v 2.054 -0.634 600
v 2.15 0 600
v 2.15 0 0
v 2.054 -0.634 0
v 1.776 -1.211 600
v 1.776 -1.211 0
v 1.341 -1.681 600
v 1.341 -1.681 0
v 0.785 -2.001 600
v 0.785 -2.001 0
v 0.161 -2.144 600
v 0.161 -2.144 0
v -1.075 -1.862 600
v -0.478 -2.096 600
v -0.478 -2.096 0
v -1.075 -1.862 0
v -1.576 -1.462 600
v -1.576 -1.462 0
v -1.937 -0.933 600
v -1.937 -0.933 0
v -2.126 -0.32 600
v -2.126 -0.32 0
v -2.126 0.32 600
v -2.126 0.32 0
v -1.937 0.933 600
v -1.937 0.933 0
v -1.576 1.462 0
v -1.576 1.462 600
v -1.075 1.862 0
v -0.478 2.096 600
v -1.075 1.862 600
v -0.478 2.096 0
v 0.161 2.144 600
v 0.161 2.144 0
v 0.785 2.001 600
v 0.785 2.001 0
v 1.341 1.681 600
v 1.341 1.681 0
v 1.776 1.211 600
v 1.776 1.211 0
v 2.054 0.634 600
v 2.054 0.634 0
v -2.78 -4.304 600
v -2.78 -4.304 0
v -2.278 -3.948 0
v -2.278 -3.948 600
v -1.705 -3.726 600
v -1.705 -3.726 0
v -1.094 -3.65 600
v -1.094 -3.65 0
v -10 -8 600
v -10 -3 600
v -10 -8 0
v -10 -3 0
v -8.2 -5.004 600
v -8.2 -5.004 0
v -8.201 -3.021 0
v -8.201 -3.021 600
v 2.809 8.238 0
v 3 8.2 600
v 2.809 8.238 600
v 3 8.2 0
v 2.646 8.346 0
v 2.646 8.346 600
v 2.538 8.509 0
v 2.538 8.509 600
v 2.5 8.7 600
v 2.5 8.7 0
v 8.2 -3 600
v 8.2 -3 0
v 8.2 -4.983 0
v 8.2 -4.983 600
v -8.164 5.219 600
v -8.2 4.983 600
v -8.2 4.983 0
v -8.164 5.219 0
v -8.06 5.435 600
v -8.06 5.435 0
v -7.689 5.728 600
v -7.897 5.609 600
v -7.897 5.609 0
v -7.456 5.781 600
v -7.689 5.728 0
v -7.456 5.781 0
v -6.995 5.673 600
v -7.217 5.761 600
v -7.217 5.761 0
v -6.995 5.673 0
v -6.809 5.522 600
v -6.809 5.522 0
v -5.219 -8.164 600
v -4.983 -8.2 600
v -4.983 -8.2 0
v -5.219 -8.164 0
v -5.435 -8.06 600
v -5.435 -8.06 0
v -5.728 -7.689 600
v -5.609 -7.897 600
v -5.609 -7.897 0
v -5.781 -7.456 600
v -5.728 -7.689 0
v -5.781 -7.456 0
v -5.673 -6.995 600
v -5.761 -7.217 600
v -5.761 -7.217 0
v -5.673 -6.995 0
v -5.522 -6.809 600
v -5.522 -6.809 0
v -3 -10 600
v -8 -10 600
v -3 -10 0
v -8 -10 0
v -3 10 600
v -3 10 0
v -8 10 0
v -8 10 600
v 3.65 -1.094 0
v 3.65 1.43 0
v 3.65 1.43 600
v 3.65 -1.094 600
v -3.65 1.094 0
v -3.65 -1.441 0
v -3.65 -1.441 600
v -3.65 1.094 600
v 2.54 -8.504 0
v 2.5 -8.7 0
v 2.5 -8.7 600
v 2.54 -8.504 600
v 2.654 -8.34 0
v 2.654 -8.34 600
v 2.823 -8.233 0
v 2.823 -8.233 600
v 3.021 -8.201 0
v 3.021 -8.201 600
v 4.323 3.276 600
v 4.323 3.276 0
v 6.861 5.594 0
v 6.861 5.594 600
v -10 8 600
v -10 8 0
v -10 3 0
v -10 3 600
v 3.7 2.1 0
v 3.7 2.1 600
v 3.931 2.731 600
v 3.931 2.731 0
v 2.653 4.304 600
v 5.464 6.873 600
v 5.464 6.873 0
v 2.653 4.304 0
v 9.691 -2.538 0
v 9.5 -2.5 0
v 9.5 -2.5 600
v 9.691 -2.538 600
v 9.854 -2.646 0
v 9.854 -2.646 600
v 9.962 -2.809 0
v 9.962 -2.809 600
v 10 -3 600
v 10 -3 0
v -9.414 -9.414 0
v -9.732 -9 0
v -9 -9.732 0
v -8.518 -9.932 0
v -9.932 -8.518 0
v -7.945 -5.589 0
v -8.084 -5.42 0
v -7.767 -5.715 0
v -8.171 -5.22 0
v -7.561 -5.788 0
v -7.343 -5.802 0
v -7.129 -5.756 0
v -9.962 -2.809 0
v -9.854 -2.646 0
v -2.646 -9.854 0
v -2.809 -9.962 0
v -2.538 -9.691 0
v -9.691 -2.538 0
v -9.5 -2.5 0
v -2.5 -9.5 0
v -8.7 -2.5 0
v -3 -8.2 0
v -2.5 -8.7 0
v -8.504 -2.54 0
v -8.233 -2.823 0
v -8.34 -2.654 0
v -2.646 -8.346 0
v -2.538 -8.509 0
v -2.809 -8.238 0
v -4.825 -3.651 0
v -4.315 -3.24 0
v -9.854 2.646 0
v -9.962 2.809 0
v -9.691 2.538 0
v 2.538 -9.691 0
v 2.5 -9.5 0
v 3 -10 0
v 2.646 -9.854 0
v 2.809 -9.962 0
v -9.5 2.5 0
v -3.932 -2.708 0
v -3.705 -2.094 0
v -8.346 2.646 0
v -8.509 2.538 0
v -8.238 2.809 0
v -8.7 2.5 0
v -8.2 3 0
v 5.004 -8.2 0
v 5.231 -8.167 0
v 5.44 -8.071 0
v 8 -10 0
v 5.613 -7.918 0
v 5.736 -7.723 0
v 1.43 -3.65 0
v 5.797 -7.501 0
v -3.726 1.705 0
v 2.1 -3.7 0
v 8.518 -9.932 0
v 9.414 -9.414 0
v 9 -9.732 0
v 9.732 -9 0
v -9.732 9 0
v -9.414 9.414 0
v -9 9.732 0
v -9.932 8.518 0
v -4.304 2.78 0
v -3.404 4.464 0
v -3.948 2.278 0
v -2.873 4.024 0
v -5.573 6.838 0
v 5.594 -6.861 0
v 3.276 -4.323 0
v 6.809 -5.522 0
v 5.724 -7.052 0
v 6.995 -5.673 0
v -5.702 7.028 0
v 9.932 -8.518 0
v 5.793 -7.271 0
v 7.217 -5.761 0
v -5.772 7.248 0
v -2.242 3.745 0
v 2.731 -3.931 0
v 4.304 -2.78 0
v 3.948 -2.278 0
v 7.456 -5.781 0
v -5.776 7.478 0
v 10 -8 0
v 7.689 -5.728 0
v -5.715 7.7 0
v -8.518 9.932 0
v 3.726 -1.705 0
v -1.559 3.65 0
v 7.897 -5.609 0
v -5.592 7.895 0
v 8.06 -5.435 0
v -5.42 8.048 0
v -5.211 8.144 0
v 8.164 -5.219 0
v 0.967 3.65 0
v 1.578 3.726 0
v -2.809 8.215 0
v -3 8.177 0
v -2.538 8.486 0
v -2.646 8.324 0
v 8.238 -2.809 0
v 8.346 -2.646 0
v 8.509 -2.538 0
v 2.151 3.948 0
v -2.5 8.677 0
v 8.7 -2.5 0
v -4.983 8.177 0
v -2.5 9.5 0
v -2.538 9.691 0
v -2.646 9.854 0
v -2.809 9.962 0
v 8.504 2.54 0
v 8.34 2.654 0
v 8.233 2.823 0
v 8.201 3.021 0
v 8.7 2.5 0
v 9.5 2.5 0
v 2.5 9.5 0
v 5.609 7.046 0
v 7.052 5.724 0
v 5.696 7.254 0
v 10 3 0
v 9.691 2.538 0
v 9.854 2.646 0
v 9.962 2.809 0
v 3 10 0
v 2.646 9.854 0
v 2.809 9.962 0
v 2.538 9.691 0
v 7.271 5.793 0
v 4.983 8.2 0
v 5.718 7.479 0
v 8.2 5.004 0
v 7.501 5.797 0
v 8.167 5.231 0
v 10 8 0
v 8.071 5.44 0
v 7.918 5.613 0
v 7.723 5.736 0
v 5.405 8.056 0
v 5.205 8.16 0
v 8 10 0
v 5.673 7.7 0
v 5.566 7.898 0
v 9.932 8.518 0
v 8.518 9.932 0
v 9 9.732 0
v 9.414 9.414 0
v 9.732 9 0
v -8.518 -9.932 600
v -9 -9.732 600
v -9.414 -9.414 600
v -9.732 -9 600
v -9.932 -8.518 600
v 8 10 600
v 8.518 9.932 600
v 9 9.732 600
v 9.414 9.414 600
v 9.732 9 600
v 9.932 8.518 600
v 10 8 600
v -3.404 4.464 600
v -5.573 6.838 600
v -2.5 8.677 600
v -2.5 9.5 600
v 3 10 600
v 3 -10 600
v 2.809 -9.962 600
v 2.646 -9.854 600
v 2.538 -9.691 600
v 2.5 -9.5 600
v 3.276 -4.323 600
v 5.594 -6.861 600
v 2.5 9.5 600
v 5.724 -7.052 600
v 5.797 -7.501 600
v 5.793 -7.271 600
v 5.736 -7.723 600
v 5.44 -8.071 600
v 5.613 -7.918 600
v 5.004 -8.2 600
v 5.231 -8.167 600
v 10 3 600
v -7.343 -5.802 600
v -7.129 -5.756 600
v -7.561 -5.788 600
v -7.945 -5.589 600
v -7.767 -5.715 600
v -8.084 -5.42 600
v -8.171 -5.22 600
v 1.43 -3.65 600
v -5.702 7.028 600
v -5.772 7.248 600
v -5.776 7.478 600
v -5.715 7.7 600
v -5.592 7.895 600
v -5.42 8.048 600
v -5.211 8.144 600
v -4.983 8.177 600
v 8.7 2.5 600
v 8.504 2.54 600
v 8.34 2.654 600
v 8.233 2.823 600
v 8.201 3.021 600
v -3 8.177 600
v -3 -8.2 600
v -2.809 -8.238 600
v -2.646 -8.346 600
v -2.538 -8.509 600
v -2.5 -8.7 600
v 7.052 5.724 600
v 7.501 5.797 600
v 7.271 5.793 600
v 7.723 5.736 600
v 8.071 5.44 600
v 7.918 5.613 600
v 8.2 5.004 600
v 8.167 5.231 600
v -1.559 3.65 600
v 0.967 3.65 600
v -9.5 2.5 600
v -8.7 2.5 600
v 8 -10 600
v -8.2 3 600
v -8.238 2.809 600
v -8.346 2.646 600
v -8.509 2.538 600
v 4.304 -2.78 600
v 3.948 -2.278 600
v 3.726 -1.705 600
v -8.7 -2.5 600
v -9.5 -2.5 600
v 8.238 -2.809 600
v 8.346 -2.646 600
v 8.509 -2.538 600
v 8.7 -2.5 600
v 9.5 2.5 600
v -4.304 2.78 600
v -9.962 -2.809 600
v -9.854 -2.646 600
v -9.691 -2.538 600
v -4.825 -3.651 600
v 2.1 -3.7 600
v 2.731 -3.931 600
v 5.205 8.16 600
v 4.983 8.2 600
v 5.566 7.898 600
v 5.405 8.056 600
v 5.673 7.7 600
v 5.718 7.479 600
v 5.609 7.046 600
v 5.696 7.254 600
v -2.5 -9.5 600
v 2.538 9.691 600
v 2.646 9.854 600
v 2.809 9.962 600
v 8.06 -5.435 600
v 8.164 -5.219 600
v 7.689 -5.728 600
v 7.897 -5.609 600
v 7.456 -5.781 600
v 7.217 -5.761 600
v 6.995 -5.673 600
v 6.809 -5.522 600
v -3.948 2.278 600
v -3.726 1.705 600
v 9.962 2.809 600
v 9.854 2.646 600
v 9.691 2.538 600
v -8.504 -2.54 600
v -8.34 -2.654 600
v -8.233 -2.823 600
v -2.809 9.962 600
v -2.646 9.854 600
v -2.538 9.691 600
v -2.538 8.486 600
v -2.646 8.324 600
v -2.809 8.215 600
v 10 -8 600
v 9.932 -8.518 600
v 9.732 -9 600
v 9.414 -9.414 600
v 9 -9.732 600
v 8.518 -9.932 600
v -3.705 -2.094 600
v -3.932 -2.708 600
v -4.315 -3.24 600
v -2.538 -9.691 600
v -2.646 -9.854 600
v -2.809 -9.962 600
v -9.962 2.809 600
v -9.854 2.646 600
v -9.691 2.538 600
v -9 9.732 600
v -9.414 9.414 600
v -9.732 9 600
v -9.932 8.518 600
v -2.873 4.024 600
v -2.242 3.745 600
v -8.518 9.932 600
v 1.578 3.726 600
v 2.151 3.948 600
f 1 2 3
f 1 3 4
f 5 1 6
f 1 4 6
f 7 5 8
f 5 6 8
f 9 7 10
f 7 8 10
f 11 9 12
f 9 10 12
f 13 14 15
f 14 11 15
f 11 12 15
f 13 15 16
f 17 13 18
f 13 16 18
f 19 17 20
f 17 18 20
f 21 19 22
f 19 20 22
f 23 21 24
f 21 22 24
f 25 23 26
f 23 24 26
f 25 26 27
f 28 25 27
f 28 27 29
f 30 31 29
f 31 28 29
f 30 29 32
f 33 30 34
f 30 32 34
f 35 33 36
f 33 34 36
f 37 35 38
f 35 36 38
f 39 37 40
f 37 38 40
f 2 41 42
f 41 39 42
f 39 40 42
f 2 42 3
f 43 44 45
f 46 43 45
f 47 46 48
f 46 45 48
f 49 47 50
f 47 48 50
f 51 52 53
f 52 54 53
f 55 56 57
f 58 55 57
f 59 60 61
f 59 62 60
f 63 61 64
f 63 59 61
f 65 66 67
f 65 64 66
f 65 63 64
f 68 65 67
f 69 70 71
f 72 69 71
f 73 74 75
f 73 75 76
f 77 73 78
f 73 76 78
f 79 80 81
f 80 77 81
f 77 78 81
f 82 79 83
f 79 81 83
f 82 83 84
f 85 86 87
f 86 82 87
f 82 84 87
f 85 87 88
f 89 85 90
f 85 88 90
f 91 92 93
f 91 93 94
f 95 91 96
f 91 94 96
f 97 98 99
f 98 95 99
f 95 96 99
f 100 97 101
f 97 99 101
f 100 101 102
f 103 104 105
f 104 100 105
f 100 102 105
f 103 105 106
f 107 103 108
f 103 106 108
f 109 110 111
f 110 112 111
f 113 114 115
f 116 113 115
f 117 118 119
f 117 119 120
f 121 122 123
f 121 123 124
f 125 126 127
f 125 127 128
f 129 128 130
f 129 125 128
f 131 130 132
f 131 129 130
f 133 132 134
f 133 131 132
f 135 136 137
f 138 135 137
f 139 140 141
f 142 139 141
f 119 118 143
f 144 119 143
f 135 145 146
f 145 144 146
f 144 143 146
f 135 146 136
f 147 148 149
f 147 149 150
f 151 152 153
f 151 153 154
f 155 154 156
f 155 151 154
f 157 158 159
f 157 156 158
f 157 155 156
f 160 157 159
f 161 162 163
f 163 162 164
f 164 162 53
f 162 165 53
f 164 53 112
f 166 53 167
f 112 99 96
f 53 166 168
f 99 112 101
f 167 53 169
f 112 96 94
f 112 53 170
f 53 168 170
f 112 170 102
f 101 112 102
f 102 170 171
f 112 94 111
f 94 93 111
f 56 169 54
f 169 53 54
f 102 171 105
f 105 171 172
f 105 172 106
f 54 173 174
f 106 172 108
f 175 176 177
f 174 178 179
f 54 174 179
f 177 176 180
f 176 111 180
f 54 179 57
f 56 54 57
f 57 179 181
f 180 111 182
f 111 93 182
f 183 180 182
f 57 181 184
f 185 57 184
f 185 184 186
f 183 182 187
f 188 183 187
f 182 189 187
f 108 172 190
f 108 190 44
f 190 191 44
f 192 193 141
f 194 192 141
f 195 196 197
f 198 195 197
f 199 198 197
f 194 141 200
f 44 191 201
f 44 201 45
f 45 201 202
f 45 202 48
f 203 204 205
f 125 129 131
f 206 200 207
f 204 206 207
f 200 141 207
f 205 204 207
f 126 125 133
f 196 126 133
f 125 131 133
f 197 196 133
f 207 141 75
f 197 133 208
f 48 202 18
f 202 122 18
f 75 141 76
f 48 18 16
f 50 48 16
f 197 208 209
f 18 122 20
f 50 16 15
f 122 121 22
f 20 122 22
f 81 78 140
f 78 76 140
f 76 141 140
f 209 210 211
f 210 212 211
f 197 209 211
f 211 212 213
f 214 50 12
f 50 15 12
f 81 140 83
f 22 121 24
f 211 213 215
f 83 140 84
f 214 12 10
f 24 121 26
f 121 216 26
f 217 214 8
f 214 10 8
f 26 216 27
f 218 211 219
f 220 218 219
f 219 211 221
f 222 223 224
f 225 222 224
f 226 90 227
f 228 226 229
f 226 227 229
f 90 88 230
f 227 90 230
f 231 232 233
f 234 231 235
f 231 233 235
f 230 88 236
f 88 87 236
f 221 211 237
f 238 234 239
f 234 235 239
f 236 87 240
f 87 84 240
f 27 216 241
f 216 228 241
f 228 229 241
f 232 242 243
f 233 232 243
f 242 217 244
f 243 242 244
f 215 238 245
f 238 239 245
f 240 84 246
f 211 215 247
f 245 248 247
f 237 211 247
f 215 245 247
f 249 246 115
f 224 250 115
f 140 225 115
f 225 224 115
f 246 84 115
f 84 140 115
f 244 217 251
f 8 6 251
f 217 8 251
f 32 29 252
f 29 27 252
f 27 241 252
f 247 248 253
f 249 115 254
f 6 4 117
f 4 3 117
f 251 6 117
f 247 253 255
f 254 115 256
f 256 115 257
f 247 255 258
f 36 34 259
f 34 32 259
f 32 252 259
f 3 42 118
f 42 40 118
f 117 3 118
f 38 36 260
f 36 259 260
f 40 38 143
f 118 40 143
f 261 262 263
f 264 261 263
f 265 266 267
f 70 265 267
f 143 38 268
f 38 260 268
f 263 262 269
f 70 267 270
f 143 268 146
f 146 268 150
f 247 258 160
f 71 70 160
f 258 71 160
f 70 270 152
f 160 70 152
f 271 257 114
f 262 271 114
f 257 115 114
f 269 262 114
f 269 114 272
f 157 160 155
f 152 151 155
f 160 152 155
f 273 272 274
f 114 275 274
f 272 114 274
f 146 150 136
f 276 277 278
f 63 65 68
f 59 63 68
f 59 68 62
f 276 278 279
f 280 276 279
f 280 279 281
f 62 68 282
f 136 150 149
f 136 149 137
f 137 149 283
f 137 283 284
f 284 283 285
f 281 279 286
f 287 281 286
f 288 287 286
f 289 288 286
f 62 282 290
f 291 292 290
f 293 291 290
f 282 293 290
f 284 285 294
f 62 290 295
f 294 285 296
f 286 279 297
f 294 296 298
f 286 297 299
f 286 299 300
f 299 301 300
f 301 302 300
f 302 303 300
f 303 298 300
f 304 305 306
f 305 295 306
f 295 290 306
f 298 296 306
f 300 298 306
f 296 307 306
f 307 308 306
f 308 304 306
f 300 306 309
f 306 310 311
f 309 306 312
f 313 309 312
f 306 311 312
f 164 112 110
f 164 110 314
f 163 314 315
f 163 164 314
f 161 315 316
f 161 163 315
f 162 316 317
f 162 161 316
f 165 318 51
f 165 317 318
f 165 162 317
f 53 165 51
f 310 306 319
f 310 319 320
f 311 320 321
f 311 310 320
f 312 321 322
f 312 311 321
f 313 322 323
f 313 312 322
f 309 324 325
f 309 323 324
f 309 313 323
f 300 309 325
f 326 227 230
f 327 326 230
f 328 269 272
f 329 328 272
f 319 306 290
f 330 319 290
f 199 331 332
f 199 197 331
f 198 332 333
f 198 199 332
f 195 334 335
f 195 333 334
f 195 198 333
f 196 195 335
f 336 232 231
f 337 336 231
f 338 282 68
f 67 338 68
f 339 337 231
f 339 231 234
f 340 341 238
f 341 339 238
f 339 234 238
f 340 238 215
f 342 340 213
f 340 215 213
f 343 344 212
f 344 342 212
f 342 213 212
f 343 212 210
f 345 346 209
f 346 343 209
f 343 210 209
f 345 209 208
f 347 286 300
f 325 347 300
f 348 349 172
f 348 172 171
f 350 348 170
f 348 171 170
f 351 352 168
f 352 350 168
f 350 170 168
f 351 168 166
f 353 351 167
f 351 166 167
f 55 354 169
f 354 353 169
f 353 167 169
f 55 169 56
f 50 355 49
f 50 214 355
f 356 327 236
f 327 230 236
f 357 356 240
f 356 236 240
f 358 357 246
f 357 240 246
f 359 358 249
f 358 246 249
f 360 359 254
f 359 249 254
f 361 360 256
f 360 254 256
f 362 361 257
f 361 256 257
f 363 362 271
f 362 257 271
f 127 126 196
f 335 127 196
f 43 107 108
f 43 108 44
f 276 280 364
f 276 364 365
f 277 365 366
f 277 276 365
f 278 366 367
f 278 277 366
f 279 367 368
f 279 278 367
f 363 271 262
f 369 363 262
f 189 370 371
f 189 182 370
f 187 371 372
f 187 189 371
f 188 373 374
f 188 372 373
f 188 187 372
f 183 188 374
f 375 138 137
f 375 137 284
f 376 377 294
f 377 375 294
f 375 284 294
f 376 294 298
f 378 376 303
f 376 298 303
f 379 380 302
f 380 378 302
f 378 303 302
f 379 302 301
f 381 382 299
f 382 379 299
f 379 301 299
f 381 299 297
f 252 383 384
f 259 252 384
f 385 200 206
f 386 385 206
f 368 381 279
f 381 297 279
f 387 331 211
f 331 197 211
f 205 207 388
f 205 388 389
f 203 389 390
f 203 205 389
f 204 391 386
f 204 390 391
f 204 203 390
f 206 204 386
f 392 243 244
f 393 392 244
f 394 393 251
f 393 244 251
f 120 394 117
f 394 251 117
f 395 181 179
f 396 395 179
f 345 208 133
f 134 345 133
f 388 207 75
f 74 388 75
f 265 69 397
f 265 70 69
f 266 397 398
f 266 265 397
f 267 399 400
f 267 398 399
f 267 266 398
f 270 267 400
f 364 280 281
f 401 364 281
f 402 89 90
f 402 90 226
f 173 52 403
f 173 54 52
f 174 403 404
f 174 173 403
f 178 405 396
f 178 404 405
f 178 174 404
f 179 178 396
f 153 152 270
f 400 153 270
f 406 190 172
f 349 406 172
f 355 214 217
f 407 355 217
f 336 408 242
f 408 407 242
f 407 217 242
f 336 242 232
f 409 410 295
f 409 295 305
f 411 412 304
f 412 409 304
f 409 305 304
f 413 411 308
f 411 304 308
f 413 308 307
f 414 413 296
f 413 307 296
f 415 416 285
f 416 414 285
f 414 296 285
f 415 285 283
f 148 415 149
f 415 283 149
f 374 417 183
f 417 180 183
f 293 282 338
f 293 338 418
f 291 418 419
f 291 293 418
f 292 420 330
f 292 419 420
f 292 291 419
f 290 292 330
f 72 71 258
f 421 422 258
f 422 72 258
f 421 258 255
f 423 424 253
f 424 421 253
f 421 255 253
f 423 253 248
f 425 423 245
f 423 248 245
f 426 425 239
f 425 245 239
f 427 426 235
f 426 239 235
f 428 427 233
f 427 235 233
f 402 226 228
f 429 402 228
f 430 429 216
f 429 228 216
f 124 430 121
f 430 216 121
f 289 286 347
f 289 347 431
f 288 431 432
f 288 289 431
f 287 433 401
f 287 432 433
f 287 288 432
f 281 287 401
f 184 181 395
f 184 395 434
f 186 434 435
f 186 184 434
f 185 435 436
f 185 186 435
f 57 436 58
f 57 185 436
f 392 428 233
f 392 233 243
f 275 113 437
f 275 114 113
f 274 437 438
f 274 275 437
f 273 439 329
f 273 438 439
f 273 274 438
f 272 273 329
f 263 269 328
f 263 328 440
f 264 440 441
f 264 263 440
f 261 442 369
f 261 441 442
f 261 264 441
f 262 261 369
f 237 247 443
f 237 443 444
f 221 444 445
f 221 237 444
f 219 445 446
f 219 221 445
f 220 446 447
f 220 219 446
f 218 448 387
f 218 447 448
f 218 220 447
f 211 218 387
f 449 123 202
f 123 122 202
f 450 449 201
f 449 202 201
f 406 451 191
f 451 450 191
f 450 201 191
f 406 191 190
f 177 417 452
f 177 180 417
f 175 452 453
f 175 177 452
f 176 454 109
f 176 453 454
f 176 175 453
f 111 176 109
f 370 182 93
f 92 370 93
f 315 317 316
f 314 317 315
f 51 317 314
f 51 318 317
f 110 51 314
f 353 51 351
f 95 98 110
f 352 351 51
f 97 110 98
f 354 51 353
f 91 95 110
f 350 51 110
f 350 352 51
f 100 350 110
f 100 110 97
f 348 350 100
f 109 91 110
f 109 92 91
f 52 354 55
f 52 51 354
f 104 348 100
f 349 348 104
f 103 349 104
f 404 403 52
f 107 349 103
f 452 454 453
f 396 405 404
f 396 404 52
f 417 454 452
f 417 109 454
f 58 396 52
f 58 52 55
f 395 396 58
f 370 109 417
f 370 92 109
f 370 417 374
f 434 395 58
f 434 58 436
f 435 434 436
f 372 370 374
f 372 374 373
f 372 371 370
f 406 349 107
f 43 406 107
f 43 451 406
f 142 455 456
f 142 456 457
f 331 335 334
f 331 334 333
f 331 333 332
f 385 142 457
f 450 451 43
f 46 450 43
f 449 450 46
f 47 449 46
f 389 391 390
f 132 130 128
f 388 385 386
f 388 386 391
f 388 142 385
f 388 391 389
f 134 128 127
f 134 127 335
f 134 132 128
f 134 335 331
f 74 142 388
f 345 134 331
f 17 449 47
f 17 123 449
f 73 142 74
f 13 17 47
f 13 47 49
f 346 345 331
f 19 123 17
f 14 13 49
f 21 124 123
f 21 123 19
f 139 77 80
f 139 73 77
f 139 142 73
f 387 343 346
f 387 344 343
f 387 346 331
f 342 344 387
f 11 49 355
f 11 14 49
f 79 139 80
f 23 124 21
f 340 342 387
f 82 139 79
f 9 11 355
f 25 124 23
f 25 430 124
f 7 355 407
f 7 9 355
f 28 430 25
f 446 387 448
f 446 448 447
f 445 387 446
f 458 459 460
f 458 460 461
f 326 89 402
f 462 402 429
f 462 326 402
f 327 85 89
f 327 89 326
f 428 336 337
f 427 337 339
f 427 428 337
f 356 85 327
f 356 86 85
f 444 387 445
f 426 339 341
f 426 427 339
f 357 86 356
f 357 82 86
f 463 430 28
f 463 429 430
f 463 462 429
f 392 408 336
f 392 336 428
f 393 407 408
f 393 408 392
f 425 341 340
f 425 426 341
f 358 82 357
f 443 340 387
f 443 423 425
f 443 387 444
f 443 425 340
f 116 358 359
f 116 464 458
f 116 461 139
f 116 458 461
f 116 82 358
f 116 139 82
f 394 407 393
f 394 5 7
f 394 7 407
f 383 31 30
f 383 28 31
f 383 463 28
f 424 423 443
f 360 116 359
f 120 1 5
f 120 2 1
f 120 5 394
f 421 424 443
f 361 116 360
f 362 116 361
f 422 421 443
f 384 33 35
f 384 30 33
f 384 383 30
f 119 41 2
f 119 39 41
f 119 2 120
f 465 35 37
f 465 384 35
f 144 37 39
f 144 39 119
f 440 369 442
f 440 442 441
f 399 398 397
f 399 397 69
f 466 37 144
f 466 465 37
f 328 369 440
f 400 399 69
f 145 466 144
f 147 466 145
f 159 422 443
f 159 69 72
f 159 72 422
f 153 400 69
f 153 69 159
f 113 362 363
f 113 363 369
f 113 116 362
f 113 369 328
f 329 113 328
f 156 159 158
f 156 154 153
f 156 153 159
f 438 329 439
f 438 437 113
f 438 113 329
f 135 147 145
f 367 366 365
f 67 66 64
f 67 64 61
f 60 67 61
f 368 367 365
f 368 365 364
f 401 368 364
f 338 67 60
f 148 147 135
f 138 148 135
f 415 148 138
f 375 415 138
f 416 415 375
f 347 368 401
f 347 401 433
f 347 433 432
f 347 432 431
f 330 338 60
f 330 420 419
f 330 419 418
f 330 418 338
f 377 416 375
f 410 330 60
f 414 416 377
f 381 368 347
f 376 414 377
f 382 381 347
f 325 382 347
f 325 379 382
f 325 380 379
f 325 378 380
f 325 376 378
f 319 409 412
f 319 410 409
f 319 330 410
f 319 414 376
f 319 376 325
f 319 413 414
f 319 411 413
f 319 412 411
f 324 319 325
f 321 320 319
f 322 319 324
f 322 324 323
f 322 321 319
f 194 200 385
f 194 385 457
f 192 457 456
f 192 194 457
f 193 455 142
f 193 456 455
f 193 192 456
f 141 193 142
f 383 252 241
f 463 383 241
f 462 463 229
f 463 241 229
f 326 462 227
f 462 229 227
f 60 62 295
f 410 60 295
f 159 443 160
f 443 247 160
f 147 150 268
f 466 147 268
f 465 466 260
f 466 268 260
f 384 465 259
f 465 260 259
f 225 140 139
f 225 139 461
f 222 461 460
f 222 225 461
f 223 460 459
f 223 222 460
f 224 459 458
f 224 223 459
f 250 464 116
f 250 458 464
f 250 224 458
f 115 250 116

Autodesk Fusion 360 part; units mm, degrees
sketch "Sketch2" plane through (0, 0, 0) normal (0, 0, 1) x (1, 0, 0) in component "Component"
  circle A0 centre (0, 0) radius 2.15
  line L0 (-3.4043, 4.4638) -> (-5.5732, 6.8378)
  line L1 (-4.9826, 8.1774) -> (-3, 8.1774)
  line L2 (-2.5, 8.6774) -> (-2.5, 9.5)
  line L3 (-3, 10) -> (-8, 10)
  line L4 (-10, 8) -> (-10, 3)
  line L5 (-9.5, 2.5) -> (-8.7, 2.5)
  line L6 (-8.2, 3) -> (-8.2, 4.9826)
  line L7 (-6.8094, 5.5222) -> (-4.3043, 2.7802)
  arc A1 (-8, 10) -> (-10, 8) centre (-8, 8) ccw
  arc A2 (-2.5, 9.5) -> (-3, 10) centre (-3, 9.5) ccw
  arc A3 (-10, 3) -> (-9.5, 2.5) centre (-9.5, 3) ccw
  arc A4 (-8.7, 2.5) -> (-8.2, 3) centre (-8.7, 3) ccw
  arc A5 (-6.8094, 5.5222) -> (-8.2, 4.9826) centre (-7.4, 4.9826) ccw
  arc A6 (-4.9826, 8.1774) -> (-5.5732, 6.8378) centre (-4.9826, 7.3774) ccw
  arc A7 (-3, 8.1774) -> (-2.5, 8.6774) centre (-3, 8.6774) ccw
  line L8 (-1.5586, 3.65) -> (0.9669, 3.65)
  arc A8 (-3.4043, 4.4638) -> (-1.5586, 3.65) centre (-1.5586, 6.15) ccw
  arc A9 (-4.8251, -3.6514) -> (-3.65, -1.4406) centre (-6.0873, -1.5628) ccw
  arc A10 (-8.2009, -3.0209) -> (-8.7005, -2.5) centre (-8.7005, -3) ccw
  arc A11 (-3, -10) -> (-2.5, -9.5) centre (-3, -9.5) ccw
  arc A12 (-9.5, -2.5) -> (-10, -3) centre (-9.5, -3) ccw
  line L9 (-2.5, -9.5) -> (-2.5, -8.7)
  line L10 (-10, -3) -> (-10, -8)
  line L11 (-8.7005, -2.5) -> (-9.5, -2.5)
  arc A13 (-2.5, -8.7) -> (-3, -8.2) centre (-3, -8.7) ccw
  line L12 (-4.8251, -3.6514) -> (-7.1291, -5.7563)
  line L13 (-3.65, -1.4406) -> (-3.65, 1.094)
  line L14 (-3, -8.2) -> (-4.9826, -8.2)
  arc A14 (-8.2005, -5.0035) -> (-7.1291, -5.7563) centre (-7.4005, -5.0037) ccw
  arc A15 (-5.5222, -6.8094) -> (-4.9826, -8.2) centre (-4.9826, -7.4) ccw
  line L15 (-8, -10) -> (-3, -10)
  line L16 (-8.2005, -5.0035) -> (-8.2009, -3.0209)
  line L17 (-5.5222, -6.8094) -> (-2.7802, -4.3043)
  arc A16 (3.2759, -4.3232) -> (1.4298, -3.65) centre (1.5824, -6.0993) ccw
  arc A17 (3.0209, -8.2009) -> (2.5, -8.7005) centre (3, -8.7005) ccw
  arc A18 (10, -3) -> (9.5, -2.5) centre (9.5, -3) ccw
  arc A19 (2.5, -9.5) -> (3, -10) centre (3, -9.5) ccw
  line L18 (9.5, -2.5) -> (8.7, -2.5)
  line L19 (3, -10) -> (8, -10)
  line L20 (2.5, -8.7005) -> (2.5, -9.5)
  arc A20 (8.7, -2.5) -> (8.2, -3) centre (8.7, -3) ccw
  arc A21 (8, -10) -> (10, -8) centre (8, -8) ccw
  line L21 (3.2759, -4.3232) -> (5.5943, -6.8609)
  line L22 (1.4298, -3.65) -> (-1.094, -3.65)
  line L23 (8.2, -3) -> (8.2, -4.9826)
  arc A22 (5.0035, -8.2005) -> (5.5943, -6.8609) centre (5.0037, -7.4005) ccw
  arc A23 (6.8094, -5.5222) -> (8.2, -4.9826) centre (7.4, -4.9826) ccw
  line L24 (10, -8) -> (10, -3)
  line L25 (5.0035, -8.2005) -> (3.0209, -8.2009)
  line L26 (6.8094, -5.5222) -> (4.3043, -2.7802)
  arc A24 (4.3232, 3.2759) -> (3.65, 1.4298) centre (6.0993, 1.5824) ccw
  arc A25 (8.2009, 3.0209) -> (8.7005, 2.5) centre (8.7005, 3) ccw
  arc A26 (3, 10) -> (2.5, 9.5) centre (3, 9.5) ccw
  arc A27 (9.5, 2.5) -> (10, 3) centre (9.5, 3) ccw
  line L27 (2.5, 9.5) -> (2.5, 8.7)
  line L28 (10, 3) -> (10, 8)
  line L29 (8.7005, 2.5) -> (9.5, 2.5)
  arc A28 (2.5, 8.7) -> (3, 8.2) centre (3, 8.7) ccw
  arc A29 (10, 8) -> (8, 10) centre (8, 8) ccw
  line L30 (4.3232, 3.2759) -> (6.8609, 5.5943)
  line L31 (3.65, 1.4298) -> (3.65, -1.094)
  line L32 (3, 8.2) -> (4.9826, 8.2)
  arc A30 (8.2005, 5.0035) -> (6.8609, 5.5943) centre (7.4005, 5.0037) ccw
  arc A31 (5.4644, 6.8727) -> (4.9826, 8.2) centre (4.9591, 7.4404) ccw
  line L33 (8, 10) -> (3, 10)
  line L34 (8.2005, 5.0035) -> (8.2009, 3.0209)
  line L35 (5.4644, 6.8727) -> (2.6531, 4.3043)
  arc A32 (0.9669, 3.65) -> (2.6531, 4.3043) centre (0.9669, 6.15) ccw
  arc A33 (3.65, -1.094) -> (4.3043, -2.7802) centre (6.15, -1.094) ccw
  arc A34 (-1.094, -3.65) -> (-2.7802, -4.3043) centre (-1.094, -6.15) ccw
  arc A35 (-3.65, 1.094) -> (-4.3043, 2.7802) centre (-6.15, 1.094) ccw
  arc A36 (-10, -8) -> (-8, -10) centre (-8, -8) ccw
  point P0 (-10, 10)
  point P1 (-10, 2.5)
  point P2 (-10, -7.3311)
  point P3 (-8, -10)
  point P4 (-10, -10)
  point P5 (-2.5, -10)
  point P6 (10, -10)
  point P7 (10, -2.5)
  point P8 (10, 10)
  point P9 (2.5, 10)
  dimension "d17" = 4.3
  dimension "d18" = 2
  dimension "d22" = 0.5
  dimension "d23" = 0.5
  dimension "d24" = 0.5
  dimension "d25" = 1.8
  dimension "d26" = 0.8
  dimension "d27" = 0.8
  dimension "d28" = 0.5
  dimension "d39" = 1.8
  dimension "d40" = 2.5
  dimension "d43" = 2.5
  dimension "d44" = 2.5
  dimension "d45" = 2.5
  dimension "d46" = 2.5
  dimension "d47" = 5
  dimension "d48" = 6.35
  dimension "d49" = 20
  dimension "d50" = 20
  dimension "d51" = 6.35
  dimension "d52" = 6.35
  dimension "d53" = 6.35
  dimension "d54" = 2
extrude "Extrude1" add sketch "Sketch2" along normal blind 600 in component "Component"
component "Component" placed x (1, 0, 0) y (0, 1, 0) z (0, 0, 1) at (0, 0, 0)
